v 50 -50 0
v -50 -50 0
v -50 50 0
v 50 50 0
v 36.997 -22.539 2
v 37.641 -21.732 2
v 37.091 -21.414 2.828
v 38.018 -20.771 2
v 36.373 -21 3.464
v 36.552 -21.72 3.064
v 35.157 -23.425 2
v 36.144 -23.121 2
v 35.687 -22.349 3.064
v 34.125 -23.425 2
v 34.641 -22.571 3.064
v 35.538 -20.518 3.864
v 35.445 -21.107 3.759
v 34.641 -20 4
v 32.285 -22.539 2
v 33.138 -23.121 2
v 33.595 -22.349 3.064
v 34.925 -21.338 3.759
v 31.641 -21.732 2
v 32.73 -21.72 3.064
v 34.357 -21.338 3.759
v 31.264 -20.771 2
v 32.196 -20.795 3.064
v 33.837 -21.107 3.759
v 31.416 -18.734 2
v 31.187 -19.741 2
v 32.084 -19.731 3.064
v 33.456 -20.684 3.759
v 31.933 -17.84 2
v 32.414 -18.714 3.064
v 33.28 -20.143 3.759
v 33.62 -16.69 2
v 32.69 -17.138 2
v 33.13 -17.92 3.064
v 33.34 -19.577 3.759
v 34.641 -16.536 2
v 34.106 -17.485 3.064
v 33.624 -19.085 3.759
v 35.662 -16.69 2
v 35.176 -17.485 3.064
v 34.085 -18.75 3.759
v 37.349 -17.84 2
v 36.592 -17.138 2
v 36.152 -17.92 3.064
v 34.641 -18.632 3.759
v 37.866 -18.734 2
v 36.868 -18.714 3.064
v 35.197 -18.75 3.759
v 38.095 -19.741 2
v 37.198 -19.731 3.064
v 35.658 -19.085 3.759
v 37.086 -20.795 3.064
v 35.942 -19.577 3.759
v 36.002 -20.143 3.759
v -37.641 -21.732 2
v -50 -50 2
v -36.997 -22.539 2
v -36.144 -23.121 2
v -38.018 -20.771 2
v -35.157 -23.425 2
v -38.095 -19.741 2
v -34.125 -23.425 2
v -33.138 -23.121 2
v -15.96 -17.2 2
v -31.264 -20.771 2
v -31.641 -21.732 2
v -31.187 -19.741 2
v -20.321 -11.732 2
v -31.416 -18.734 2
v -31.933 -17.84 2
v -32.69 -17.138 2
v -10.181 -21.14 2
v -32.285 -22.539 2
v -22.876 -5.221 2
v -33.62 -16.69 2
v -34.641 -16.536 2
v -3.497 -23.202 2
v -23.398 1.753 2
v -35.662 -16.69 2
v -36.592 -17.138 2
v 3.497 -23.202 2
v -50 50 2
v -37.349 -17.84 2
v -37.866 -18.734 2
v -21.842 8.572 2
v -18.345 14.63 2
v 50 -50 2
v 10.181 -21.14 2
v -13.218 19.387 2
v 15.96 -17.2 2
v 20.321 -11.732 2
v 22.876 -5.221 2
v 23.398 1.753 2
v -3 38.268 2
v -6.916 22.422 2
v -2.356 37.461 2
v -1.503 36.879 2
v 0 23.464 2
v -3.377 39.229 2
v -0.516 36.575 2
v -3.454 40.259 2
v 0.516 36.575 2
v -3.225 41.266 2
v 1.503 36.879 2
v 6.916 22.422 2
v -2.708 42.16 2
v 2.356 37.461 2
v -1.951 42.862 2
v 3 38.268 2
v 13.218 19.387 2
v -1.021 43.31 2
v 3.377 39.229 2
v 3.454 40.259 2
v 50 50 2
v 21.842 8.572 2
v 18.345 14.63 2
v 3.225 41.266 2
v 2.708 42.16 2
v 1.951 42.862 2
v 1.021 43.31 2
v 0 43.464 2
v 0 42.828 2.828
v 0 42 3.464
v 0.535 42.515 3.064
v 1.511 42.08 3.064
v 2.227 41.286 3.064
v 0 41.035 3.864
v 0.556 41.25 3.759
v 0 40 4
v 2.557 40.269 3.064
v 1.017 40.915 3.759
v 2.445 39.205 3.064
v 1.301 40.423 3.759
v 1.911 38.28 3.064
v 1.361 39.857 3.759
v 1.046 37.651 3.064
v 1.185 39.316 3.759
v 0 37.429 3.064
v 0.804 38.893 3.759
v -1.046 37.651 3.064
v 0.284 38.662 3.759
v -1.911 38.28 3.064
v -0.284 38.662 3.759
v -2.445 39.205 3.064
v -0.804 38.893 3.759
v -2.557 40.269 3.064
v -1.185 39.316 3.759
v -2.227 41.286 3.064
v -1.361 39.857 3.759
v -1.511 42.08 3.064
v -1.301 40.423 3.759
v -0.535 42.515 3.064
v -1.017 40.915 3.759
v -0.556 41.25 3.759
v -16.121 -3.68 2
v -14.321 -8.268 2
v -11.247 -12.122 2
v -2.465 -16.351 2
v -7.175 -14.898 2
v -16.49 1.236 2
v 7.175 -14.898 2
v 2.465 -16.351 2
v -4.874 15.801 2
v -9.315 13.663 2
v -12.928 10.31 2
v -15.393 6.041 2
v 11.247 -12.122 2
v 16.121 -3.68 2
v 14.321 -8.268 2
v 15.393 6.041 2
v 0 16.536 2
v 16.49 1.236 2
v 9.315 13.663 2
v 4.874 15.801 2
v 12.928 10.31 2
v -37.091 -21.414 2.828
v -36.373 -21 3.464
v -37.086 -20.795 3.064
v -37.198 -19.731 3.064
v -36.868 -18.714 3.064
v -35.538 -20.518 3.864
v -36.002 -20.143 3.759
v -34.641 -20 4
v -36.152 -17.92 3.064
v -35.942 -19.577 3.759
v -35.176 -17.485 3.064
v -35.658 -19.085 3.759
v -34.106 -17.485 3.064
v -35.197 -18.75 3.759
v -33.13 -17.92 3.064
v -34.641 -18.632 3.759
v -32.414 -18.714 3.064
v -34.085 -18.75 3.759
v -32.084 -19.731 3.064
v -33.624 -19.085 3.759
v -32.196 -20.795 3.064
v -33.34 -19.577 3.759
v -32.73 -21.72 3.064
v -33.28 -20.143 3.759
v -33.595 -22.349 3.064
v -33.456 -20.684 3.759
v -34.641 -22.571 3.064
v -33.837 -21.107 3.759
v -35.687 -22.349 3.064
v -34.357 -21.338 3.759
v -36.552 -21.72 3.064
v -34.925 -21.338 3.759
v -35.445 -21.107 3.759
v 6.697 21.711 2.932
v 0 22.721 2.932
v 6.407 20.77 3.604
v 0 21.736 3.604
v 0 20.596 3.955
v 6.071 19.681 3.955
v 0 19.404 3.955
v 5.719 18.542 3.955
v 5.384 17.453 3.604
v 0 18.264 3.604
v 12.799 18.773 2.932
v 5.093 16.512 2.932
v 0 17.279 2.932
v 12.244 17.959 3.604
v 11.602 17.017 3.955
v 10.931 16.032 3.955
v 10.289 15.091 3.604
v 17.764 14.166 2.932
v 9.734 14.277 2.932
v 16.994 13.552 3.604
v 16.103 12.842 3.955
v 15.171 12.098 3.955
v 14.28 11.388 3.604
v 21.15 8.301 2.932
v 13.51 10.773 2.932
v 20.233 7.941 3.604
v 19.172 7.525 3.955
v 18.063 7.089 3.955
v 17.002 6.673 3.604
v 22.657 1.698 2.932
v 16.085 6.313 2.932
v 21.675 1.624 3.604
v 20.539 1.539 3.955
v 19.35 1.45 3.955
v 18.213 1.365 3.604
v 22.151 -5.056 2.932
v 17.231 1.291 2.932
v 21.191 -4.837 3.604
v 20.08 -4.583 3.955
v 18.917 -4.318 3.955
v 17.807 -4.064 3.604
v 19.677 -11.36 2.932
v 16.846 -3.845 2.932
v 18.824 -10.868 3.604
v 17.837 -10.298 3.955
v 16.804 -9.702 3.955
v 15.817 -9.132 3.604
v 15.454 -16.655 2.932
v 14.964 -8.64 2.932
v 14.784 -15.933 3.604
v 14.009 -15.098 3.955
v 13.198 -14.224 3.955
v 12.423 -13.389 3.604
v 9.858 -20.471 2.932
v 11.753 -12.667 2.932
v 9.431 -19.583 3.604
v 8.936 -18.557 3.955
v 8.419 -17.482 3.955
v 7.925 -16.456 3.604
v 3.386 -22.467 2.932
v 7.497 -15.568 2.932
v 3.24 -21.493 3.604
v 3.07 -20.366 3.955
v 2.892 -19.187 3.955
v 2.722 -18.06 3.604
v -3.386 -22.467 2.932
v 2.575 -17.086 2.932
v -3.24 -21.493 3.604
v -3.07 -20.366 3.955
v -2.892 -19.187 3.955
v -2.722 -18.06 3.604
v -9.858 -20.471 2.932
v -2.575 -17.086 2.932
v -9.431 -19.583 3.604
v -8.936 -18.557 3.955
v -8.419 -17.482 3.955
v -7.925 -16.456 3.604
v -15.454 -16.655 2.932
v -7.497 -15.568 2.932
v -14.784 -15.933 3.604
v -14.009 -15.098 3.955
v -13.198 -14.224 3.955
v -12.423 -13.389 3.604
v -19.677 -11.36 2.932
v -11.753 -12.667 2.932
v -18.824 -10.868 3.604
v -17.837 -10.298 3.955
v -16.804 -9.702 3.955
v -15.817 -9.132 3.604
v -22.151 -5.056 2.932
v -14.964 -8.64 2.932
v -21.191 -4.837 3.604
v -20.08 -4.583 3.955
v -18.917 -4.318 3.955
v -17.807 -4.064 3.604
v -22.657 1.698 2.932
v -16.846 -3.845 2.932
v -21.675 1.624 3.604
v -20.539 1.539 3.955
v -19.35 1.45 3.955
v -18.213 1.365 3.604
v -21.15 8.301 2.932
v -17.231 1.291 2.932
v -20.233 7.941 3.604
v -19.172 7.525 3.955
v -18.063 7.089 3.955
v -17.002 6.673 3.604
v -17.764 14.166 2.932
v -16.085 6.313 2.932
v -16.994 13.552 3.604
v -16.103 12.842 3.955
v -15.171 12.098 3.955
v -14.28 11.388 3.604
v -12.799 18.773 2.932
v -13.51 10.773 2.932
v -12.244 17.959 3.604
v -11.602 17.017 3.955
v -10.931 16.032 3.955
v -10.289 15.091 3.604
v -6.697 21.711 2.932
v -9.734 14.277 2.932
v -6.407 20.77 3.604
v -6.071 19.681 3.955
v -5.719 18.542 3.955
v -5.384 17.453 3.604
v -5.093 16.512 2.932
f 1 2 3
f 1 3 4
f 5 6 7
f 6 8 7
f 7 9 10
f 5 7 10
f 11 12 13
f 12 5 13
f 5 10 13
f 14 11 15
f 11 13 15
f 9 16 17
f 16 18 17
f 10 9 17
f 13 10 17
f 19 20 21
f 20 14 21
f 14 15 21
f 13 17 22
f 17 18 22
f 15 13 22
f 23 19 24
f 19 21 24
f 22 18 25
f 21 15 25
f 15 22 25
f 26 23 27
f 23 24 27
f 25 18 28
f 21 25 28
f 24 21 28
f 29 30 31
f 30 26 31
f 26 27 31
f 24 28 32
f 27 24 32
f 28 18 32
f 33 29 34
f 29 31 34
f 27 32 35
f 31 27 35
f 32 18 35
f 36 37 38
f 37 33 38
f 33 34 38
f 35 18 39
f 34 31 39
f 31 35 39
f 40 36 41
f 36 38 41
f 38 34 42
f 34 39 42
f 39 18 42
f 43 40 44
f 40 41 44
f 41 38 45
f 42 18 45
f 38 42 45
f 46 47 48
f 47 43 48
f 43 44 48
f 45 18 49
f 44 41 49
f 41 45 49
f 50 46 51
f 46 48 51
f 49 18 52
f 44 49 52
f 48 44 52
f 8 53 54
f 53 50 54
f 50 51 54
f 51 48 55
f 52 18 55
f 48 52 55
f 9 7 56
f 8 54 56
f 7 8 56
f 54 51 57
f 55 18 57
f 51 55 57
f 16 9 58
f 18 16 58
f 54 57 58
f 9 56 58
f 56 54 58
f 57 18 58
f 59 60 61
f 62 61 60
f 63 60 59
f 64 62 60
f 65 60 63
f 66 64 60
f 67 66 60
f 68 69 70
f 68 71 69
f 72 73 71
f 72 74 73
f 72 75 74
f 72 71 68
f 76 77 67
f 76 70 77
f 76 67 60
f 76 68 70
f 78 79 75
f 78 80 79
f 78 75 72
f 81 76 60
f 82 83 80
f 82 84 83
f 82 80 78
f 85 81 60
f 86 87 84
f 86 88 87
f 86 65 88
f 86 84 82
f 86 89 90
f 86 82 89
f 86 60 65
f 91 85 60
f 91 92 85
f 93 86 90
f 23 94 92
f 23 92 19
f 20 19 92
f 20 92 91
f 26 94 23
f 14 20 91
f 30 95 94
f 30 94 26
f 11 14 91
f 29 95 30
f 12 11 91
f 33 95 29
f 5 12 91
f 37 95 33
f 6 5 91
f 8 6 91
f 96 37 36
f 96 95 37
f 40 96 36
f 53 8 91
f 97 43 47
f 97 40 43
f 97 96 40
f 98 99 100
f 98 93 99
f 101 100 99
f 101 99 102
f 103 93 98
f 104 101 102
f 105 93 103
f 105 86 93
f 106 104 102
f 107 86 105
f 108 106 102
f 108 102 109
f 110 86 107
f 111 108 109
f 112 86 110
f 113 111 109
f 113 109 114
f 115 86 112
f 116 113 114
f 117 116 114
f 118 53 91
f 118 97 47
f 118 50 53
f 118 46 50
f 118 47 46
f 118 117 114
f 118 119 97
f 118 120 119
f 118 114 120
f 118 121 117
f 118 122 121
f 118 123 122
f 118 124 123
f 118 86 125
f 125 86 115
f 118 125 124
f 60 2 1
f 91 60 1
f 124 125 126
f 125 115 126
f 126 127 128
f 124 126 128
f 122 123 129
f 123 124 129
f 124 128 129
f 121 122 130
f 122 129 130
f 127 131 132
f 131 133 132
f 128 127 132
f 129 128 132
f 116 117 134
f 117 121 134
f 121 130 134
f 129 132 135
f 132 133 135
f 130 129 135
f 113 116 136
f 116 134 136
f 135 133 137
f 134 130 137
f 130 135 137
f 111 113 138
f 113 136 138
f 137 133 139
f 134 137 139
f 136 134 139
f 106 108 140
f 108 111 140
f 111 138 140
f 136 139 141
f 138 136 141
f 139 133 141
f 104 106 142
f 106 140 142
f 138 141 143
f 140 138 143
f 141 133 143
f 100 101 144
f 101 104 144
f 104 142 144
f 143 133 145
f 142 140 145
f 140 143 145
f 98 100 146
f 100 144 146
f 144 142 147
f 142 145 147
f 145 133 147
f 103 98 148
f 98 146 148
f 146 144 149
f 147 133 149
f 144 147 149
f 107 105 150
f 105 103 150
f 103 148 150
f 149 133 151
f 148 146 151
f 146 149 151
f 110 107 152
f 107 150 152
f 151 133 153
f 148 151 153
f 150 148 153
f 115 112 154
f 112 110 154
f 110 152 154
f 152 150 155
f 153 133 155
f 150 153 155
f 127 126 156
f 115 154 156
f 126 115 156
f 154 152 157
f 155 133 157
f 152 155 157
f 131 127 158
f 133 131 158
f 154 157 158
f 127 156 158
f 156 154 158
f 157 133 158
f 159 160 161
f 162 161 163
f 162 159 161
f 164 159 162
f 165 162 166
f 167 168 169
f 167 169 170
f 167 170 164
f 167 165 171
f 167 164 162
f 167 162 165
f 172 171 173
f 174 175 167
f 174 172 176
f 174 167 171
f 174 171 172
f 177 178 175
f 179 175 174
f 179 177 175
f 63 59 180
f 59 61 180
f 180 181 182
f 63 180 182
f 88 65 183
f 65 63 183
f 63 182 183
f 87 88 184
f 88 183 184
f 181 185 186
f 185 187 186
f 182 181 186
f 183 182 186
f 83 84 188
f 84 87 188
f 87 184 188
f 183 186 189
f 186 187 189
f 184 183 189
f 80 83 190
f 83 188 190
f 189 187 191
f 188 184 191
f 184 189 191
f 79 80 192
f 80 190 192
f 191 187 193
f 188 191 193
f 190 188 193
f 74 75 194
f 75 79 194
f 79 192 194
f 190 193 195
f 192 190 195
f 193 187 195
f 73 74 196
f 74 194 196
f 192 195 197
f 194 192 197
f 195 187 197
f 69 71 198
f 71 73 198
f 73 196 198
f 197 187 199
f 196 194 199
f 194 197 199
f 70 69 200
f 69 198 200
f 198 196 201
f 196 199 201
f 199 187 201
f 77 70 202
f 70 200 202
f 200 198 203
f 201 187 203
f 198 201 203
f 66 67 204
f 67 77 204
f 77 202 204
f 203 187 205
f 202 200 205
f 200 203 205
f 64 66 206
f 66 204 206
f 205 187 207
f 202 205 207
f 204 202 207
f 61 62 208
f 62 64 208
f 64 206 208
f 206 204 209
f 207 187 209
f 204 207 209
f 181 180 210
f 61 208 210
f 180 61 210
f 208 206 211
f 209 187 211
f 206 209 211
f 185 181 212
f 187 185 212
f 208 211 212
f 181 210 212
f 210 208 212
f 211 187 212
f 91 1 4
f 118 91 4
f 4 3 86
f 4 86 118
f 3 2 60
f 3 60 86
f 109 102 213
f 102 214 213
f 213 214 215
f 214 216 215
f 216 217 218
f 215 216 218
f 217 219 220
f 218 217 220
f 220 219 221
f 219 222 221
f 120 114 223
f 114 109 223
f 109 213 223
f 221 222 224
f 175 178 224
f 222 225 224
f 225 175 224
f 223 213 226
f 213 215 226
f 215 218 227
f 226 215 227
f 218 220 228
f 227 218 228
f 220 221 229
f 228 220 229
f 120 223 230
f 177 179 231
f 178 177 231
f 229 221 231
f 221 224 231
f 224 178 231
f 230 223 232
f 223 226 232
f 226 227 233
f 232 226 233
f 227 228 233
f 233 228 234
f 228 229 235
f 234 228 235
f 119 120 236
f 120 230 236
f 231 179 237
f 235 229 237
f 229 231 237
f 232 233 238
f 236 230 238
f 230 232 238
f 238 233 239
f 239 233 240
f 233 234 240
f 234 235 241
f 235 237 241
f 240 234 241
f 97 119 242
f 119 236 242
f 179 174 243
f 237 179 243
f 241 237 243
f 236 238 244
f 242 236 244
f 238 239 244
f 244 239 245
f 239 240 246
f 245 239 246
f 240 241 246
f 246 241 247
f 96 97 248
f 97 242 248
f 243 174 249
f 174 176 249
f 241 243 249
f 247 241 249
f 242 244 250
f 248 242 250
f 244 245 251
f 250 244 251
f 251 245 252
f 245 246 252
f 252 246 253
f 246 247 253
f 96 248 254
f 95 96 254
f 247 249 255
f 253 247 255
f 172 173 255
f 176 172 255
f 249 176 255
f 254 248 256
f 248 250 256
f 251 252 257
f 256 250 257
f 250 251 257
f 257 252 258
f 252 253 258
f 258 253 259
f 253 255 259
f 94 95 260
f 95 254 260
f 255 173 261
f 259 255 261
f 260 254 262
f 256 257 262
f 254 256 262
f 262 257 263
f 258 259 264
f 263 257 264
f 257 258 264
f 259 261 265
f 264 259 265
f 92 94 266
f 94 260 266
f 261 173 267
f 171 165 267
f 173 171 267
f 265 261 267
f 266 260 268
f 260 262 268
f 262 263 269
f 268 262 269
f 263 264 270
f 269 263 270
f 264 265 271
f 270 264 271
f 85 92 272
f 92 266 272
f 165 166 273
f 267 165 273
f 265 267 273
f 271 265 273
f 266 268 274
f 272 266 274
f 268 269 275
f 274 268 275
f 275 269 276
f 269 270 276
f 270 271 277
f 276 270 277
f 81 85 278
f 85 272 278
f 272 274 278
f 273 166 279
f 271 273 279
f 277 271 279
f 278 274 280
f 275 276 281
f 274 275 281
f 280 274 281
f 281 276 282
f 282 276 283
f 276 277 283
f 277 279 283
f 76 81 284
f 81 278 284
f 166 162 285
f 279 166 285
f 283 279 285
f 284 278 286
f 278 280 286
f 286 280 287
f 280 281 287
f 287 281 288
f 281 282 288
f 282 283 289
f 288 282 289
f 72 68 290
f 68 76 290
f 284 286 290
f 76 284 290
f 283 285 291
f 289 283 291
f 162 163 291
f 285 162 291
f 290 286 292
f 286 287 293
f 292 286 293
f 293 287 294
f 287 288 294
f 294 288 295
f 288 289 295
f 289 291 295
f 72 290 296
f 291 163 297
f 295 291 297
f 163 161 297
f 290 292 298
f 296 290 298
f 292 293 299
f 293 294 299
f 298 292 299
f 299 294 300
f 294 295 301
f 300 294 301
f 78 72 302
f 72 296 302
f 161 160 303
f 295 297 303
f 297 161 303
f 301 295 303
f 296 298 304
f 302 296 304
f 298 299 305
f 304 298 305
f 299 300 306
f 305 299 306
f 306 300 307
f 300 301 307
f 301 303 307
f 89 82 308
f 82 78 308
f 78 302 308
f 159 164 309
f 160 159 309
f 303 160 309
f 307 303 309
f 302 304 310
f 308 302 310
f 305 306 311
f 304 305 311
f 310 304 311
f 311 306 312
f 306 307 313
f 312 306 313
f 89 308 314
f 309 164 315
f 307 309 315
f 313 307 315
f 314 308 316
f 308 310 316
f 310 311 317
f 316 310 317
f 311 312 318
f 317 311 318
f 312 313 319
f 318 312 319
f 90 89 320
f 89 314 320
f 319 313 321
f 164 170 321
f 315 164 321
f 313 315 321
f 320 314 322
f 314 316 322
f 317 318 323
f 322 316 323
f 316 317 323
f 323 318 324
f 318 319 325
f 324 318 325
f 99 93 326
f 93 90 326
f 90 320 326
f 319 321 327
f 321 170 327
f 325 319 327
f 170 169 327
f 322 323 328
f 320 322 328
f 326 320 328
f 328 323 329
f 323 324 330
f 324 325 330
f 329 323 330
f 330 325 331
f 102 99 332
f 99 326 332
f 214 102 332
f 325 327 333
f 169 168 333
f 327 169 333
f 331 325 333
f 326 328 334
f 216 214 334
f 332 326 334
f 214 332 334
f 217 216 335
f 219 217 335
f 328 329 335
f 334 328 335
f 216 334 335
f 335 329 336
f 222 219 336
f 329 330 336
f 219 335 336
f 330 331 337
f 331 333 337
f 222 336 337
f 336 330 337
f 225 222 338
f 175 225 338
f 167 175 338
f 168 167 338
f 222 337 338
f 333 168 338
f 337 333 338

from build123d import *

# Parameters (mm, degrees)
F0_W     = 100.0000410745
F0_H     = 100
F1_DEPTH = 2
F6_COUNT = 3


with BuildPart() as f1:
    # F0 (on Top) → F1 (new body)
    with BuildSketch(Plane.XY):
        with Locations((2.05373e-05, 0)):
            Rectangle(F0_W, F0_H)
    extrude(amount=F1_DEPTH)

    # F2 (on Right) → F3 (revolve)
    with BuildSketch(Plane.YZ):
        with BuildLine():
            Line((16, 0), (24, 0))
            ThreePointArc((24, 0), (20, 4), (16, 0))
        make_face()
    revolve(axis=Axis((0, 0, 3.7722848356), (0, 0, -1)))

    # F4 (on Right) → F5 (revolve)
    with BuildSketch(Plane.YZ):
        with BuildLine():
            Line((40, 0), (44, 0))
            ThreePointArc((44, 0), (42.8284271247, 2.8284271247), (40, 4))
            Line((40, 4), (40, 0))
        make_face()
    f5 = revolve(axis=Axis((0, 40, 1.4672121033), (0, 0, -1)))

    # F6: F5 ×3 about axis
    f6_axis = Axis((0, 0, 3.7722848356), (0, 0, -1))
    for i in range(1, F6_COUNT):
        add(f5.rotate(f6_axis, i * 360 / F6_COUNT))


solid = f1.part
